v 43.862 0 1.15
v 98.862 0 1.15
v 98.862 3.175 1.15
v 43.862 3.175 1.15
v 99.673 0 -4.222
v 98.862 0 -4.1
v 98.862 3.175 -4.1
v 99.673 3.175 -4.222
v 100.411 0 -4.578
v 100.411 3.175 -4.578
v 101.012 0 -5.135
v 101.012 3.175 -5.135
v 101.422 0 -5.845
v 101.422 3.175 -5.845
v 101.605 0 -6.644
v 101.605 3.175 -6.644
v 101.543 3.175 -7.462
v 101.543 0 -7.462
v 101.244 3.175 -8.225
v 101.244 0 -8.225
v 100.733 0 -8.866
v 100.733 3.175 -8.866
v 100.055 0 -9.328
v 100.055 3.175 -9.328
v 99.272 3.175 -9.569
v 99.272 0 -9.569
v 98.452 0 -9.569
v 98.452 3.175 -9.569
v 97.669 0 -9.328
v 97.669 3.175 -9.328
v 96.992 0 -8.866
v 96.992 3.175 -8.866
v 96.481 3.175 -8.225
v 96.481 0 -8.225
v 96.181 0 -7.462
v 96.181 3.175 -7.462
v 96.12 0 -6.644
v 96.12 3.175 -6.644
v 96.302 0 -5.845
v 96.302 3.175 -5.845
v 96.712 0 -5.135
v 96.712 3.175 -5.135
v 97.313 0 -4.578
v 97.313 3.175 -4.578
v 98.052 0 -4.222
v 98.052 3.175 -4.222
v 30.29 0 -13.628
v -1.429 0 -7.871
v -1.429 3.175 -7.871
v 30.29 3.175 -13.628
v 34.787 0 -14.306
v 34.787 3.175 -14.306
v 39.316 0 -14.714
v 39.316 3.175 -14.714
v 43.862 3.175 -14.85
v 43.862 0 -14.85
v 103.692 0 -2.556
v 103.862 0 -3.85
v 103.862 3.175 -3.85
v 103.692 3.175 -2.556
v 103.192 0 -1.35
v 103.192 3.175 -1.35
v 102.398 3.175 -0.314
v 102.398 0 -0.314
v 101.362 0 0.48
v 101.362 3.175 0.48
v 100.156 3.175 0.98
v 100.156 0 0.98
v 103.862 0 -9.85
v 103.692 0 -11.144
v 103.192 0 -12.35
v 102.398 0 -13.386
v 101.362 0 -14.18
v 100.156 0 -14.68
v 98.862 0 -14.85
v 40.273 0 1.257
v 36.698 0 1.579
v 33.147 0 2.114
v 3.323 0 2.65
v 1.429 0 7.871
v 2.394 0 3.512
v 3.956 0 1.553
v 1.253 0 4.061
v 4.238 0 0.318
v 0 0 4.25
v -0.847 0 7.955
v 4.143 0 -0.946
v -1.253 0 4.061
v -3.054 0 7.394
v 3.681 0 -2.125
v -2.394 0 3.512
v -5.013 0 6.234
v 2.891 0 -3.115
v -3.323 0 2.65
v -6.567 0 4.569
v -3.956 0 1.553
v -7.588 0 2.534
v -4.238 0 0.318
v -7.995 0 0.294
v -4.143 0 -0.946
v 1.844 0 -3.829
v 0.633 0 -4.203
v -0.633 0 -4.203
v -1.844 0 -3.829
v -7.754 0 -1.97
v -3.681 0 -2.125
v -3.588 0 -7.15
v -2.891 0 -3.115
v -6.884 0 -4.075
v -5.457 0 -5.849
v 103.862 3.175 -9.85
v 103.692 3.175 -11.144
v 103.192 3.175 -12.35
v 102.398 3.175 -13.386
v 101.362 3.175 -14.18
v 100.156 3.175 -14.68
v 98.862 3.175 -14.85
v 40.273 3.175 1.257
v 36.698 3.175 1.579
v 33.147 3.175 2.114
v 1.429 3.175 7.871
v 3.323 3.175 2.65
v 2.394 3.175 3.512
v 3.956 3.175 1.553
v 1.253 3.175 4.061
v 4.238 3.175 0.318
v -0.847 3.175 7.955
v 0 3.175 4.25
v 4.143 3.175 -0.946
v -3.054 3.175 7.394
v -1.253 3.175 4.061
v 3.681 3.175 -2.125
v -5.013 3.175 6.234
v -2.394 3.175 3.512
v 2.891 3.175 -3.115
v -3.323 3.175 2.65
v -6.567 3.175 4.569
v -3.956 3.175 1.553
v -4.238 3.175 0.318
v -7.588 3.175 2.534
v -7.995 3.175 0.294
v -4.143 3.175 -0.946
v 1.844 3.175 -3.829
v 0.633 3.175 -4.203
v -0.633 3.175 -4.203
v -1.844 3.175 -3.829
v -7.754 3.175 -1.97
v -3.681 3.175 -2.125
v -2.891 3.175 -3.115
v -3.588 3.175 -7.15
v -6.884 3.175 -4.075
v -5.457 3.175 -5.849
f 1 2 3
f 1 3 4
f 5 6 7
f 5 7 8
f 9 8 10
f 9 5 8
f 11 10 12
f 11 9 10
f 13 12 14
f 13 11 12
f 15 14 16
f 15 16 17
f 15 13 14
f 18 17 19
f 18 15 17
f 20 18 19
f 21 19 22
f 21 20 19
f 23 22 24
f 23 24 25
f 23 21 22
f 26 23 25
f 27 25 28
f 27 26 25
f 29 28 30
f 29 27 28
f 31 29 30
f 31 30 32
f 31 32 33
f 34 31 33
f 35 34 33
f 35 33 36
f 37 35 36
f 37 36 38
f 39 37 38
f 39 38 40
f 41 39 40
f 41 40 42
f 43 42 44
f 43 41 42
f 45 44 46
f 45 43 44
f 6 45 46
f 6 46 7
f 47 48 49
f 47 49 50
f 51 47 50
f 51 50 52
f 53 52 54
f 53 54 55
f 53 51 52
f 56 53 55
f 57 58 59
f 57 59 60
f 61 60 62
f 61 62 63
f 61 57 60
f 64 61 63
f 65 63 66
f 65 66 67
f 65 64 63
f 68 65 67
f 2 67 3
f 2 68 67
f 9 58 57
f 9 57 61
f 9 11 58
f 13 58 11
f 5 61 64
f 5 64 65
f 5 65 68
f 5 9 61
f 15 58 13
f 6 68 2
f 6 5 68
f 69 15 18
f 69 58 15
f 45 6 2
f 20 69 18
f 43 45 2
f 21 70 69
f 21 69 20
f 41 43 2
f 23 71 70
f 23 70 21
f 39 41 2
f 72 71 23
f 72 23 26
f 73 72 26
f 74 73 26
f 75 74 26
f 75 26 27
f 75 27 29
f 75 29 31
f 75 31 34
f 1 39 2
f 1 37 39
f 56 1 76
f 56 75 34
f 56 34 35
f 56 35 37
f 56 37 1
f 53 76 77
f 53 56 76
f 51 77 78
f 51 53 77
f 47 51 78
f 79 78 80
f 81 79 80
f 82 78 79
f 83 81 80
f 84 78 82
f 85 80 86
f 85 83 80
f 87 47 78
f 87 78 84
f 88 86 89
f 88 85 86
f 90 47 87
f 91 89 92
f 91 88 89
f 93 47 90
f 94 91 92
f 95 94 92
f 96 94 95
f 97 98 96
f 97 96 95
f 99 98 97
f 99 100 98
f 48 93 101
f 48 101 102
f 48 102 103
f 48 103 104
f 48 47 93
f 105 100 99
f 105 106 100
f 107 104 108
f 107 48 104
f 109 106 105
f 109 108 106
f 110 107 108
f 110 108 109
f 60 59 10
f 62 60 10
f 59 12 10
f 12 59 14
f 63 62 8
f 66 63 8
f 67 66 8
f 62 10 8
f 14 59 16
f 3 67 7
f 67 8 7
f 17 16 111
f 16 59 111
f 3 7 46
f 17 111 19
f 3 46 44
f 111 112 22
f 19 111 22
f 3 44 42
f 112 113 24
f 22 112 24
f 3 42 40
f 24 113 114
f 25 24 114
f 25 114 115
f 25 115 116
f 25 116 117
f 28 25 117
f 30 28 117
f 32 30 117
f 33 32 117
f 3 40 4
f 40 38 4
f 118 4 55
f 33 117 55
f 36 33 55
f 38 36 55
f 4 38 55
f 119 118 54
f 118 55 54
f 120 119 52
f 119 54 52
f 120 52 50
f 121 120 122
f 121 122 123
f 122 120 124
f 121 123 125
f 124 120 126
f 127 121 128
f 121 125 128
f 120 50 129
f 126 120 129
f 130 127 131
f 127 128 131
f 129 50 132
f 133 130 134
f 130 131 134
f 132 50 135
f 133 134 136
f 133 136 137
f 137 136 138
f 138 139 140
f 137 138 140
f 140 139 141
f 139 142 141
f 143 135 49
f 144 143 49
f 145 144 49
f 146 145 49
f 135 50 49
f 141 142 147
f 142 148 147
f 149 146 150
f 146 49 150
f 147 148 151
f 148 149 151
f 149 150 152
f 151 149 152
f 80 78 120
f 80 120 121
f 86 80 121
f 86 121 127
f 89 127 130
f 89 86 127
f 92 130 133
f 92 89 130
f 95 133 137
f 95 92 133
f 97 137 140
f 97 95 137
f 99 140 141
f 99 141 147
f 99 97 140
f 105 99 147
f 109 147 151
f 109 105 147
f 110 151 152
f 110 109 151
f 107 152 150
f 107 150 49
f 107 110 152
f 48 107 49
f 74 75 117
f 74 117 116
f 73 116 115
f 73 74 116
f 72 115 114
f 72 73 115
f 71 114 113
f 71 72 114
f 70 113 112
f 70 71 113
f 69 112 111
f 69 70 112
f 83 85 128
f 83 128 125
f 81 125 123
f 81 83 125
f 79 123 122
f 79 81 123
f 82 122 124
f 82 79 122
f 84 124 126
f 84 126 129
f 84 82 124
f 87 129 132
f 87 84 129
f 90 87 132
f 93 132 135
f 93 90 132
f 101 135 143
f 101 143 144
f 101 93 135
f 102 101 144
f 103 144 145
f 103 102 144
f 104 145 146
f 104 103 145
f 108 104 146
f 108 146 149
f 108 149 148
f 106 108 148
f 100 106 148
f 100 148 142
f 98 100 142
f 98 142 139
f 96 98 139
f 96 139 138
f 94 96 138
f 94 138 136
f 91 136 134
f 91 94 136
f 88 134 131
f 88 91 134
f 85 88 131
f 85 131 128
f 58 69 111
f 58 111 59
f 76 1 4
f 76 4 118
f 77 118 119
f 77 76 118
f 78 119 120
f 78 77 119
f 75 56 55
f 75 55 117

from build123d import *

# Parameters (mm, degrees)
SKETCH1_R           = 4.25
SKETCH1_R_2         = 2.75
BOSS_EXTRUDE1_DEPTH = 3.175


with BuildPart() as part:
    # Sketch1 → Boss-Extrude1 (new body)
    with BuildSketch(Plane(origin=(0, 0, 0), x_dir=(1, 0, 0), z_dir=(0, 1, 0))):
        with BuildLine():
            Line((-1.428652306, 7.871400929), (30.290003092, 13.628308828))
            ThreePointArc((30.290003092, 13.628308828), (37.048664607, 14.543961024), (43.8622, 14.85))
            Line((43.8622, 14.85), (98.8622, 14.85))
            ThreePointArc((98.8622, 14.85), (102.397733906, 13.385533906), (103.8622, 9.85))
            Line((103.8622, 9.85), (103.8622, 3.85))
            ThreePointArc((103.8622, 3.85), (102.397733906, 0.314466094), (98.8622, -1.15))
            Line((98.8622, -1.15), (43.8622, -1.15))
            ThreePointArc((43.8622, -1.15), (38.483093111, -1.391609718), (33.147307705, -2.114493031))
            Line((33.147307705, -2.114493031), (1.428652306, -7.871400929))
            ThreePointArc((1.428652306, -7.871400929), (-7.871400929, -1.428652306), (-1.428652306, 7.871400929))
        make_face()
        with Locations(Location((0, 0, 0), (0, 0, 270))):
            Circle(SKETCH1_R, mode=Mode.SUBTRACT)
        with Locations(Location((98.8622, 6.85, 0), (0, 0, 270))):
            Circle(SKETCH1_R_2, mode=Mode.SUBTRACT)
    extrude(amount=BOSS_EXTRUDE1_DEPTH)


solid = part.part
